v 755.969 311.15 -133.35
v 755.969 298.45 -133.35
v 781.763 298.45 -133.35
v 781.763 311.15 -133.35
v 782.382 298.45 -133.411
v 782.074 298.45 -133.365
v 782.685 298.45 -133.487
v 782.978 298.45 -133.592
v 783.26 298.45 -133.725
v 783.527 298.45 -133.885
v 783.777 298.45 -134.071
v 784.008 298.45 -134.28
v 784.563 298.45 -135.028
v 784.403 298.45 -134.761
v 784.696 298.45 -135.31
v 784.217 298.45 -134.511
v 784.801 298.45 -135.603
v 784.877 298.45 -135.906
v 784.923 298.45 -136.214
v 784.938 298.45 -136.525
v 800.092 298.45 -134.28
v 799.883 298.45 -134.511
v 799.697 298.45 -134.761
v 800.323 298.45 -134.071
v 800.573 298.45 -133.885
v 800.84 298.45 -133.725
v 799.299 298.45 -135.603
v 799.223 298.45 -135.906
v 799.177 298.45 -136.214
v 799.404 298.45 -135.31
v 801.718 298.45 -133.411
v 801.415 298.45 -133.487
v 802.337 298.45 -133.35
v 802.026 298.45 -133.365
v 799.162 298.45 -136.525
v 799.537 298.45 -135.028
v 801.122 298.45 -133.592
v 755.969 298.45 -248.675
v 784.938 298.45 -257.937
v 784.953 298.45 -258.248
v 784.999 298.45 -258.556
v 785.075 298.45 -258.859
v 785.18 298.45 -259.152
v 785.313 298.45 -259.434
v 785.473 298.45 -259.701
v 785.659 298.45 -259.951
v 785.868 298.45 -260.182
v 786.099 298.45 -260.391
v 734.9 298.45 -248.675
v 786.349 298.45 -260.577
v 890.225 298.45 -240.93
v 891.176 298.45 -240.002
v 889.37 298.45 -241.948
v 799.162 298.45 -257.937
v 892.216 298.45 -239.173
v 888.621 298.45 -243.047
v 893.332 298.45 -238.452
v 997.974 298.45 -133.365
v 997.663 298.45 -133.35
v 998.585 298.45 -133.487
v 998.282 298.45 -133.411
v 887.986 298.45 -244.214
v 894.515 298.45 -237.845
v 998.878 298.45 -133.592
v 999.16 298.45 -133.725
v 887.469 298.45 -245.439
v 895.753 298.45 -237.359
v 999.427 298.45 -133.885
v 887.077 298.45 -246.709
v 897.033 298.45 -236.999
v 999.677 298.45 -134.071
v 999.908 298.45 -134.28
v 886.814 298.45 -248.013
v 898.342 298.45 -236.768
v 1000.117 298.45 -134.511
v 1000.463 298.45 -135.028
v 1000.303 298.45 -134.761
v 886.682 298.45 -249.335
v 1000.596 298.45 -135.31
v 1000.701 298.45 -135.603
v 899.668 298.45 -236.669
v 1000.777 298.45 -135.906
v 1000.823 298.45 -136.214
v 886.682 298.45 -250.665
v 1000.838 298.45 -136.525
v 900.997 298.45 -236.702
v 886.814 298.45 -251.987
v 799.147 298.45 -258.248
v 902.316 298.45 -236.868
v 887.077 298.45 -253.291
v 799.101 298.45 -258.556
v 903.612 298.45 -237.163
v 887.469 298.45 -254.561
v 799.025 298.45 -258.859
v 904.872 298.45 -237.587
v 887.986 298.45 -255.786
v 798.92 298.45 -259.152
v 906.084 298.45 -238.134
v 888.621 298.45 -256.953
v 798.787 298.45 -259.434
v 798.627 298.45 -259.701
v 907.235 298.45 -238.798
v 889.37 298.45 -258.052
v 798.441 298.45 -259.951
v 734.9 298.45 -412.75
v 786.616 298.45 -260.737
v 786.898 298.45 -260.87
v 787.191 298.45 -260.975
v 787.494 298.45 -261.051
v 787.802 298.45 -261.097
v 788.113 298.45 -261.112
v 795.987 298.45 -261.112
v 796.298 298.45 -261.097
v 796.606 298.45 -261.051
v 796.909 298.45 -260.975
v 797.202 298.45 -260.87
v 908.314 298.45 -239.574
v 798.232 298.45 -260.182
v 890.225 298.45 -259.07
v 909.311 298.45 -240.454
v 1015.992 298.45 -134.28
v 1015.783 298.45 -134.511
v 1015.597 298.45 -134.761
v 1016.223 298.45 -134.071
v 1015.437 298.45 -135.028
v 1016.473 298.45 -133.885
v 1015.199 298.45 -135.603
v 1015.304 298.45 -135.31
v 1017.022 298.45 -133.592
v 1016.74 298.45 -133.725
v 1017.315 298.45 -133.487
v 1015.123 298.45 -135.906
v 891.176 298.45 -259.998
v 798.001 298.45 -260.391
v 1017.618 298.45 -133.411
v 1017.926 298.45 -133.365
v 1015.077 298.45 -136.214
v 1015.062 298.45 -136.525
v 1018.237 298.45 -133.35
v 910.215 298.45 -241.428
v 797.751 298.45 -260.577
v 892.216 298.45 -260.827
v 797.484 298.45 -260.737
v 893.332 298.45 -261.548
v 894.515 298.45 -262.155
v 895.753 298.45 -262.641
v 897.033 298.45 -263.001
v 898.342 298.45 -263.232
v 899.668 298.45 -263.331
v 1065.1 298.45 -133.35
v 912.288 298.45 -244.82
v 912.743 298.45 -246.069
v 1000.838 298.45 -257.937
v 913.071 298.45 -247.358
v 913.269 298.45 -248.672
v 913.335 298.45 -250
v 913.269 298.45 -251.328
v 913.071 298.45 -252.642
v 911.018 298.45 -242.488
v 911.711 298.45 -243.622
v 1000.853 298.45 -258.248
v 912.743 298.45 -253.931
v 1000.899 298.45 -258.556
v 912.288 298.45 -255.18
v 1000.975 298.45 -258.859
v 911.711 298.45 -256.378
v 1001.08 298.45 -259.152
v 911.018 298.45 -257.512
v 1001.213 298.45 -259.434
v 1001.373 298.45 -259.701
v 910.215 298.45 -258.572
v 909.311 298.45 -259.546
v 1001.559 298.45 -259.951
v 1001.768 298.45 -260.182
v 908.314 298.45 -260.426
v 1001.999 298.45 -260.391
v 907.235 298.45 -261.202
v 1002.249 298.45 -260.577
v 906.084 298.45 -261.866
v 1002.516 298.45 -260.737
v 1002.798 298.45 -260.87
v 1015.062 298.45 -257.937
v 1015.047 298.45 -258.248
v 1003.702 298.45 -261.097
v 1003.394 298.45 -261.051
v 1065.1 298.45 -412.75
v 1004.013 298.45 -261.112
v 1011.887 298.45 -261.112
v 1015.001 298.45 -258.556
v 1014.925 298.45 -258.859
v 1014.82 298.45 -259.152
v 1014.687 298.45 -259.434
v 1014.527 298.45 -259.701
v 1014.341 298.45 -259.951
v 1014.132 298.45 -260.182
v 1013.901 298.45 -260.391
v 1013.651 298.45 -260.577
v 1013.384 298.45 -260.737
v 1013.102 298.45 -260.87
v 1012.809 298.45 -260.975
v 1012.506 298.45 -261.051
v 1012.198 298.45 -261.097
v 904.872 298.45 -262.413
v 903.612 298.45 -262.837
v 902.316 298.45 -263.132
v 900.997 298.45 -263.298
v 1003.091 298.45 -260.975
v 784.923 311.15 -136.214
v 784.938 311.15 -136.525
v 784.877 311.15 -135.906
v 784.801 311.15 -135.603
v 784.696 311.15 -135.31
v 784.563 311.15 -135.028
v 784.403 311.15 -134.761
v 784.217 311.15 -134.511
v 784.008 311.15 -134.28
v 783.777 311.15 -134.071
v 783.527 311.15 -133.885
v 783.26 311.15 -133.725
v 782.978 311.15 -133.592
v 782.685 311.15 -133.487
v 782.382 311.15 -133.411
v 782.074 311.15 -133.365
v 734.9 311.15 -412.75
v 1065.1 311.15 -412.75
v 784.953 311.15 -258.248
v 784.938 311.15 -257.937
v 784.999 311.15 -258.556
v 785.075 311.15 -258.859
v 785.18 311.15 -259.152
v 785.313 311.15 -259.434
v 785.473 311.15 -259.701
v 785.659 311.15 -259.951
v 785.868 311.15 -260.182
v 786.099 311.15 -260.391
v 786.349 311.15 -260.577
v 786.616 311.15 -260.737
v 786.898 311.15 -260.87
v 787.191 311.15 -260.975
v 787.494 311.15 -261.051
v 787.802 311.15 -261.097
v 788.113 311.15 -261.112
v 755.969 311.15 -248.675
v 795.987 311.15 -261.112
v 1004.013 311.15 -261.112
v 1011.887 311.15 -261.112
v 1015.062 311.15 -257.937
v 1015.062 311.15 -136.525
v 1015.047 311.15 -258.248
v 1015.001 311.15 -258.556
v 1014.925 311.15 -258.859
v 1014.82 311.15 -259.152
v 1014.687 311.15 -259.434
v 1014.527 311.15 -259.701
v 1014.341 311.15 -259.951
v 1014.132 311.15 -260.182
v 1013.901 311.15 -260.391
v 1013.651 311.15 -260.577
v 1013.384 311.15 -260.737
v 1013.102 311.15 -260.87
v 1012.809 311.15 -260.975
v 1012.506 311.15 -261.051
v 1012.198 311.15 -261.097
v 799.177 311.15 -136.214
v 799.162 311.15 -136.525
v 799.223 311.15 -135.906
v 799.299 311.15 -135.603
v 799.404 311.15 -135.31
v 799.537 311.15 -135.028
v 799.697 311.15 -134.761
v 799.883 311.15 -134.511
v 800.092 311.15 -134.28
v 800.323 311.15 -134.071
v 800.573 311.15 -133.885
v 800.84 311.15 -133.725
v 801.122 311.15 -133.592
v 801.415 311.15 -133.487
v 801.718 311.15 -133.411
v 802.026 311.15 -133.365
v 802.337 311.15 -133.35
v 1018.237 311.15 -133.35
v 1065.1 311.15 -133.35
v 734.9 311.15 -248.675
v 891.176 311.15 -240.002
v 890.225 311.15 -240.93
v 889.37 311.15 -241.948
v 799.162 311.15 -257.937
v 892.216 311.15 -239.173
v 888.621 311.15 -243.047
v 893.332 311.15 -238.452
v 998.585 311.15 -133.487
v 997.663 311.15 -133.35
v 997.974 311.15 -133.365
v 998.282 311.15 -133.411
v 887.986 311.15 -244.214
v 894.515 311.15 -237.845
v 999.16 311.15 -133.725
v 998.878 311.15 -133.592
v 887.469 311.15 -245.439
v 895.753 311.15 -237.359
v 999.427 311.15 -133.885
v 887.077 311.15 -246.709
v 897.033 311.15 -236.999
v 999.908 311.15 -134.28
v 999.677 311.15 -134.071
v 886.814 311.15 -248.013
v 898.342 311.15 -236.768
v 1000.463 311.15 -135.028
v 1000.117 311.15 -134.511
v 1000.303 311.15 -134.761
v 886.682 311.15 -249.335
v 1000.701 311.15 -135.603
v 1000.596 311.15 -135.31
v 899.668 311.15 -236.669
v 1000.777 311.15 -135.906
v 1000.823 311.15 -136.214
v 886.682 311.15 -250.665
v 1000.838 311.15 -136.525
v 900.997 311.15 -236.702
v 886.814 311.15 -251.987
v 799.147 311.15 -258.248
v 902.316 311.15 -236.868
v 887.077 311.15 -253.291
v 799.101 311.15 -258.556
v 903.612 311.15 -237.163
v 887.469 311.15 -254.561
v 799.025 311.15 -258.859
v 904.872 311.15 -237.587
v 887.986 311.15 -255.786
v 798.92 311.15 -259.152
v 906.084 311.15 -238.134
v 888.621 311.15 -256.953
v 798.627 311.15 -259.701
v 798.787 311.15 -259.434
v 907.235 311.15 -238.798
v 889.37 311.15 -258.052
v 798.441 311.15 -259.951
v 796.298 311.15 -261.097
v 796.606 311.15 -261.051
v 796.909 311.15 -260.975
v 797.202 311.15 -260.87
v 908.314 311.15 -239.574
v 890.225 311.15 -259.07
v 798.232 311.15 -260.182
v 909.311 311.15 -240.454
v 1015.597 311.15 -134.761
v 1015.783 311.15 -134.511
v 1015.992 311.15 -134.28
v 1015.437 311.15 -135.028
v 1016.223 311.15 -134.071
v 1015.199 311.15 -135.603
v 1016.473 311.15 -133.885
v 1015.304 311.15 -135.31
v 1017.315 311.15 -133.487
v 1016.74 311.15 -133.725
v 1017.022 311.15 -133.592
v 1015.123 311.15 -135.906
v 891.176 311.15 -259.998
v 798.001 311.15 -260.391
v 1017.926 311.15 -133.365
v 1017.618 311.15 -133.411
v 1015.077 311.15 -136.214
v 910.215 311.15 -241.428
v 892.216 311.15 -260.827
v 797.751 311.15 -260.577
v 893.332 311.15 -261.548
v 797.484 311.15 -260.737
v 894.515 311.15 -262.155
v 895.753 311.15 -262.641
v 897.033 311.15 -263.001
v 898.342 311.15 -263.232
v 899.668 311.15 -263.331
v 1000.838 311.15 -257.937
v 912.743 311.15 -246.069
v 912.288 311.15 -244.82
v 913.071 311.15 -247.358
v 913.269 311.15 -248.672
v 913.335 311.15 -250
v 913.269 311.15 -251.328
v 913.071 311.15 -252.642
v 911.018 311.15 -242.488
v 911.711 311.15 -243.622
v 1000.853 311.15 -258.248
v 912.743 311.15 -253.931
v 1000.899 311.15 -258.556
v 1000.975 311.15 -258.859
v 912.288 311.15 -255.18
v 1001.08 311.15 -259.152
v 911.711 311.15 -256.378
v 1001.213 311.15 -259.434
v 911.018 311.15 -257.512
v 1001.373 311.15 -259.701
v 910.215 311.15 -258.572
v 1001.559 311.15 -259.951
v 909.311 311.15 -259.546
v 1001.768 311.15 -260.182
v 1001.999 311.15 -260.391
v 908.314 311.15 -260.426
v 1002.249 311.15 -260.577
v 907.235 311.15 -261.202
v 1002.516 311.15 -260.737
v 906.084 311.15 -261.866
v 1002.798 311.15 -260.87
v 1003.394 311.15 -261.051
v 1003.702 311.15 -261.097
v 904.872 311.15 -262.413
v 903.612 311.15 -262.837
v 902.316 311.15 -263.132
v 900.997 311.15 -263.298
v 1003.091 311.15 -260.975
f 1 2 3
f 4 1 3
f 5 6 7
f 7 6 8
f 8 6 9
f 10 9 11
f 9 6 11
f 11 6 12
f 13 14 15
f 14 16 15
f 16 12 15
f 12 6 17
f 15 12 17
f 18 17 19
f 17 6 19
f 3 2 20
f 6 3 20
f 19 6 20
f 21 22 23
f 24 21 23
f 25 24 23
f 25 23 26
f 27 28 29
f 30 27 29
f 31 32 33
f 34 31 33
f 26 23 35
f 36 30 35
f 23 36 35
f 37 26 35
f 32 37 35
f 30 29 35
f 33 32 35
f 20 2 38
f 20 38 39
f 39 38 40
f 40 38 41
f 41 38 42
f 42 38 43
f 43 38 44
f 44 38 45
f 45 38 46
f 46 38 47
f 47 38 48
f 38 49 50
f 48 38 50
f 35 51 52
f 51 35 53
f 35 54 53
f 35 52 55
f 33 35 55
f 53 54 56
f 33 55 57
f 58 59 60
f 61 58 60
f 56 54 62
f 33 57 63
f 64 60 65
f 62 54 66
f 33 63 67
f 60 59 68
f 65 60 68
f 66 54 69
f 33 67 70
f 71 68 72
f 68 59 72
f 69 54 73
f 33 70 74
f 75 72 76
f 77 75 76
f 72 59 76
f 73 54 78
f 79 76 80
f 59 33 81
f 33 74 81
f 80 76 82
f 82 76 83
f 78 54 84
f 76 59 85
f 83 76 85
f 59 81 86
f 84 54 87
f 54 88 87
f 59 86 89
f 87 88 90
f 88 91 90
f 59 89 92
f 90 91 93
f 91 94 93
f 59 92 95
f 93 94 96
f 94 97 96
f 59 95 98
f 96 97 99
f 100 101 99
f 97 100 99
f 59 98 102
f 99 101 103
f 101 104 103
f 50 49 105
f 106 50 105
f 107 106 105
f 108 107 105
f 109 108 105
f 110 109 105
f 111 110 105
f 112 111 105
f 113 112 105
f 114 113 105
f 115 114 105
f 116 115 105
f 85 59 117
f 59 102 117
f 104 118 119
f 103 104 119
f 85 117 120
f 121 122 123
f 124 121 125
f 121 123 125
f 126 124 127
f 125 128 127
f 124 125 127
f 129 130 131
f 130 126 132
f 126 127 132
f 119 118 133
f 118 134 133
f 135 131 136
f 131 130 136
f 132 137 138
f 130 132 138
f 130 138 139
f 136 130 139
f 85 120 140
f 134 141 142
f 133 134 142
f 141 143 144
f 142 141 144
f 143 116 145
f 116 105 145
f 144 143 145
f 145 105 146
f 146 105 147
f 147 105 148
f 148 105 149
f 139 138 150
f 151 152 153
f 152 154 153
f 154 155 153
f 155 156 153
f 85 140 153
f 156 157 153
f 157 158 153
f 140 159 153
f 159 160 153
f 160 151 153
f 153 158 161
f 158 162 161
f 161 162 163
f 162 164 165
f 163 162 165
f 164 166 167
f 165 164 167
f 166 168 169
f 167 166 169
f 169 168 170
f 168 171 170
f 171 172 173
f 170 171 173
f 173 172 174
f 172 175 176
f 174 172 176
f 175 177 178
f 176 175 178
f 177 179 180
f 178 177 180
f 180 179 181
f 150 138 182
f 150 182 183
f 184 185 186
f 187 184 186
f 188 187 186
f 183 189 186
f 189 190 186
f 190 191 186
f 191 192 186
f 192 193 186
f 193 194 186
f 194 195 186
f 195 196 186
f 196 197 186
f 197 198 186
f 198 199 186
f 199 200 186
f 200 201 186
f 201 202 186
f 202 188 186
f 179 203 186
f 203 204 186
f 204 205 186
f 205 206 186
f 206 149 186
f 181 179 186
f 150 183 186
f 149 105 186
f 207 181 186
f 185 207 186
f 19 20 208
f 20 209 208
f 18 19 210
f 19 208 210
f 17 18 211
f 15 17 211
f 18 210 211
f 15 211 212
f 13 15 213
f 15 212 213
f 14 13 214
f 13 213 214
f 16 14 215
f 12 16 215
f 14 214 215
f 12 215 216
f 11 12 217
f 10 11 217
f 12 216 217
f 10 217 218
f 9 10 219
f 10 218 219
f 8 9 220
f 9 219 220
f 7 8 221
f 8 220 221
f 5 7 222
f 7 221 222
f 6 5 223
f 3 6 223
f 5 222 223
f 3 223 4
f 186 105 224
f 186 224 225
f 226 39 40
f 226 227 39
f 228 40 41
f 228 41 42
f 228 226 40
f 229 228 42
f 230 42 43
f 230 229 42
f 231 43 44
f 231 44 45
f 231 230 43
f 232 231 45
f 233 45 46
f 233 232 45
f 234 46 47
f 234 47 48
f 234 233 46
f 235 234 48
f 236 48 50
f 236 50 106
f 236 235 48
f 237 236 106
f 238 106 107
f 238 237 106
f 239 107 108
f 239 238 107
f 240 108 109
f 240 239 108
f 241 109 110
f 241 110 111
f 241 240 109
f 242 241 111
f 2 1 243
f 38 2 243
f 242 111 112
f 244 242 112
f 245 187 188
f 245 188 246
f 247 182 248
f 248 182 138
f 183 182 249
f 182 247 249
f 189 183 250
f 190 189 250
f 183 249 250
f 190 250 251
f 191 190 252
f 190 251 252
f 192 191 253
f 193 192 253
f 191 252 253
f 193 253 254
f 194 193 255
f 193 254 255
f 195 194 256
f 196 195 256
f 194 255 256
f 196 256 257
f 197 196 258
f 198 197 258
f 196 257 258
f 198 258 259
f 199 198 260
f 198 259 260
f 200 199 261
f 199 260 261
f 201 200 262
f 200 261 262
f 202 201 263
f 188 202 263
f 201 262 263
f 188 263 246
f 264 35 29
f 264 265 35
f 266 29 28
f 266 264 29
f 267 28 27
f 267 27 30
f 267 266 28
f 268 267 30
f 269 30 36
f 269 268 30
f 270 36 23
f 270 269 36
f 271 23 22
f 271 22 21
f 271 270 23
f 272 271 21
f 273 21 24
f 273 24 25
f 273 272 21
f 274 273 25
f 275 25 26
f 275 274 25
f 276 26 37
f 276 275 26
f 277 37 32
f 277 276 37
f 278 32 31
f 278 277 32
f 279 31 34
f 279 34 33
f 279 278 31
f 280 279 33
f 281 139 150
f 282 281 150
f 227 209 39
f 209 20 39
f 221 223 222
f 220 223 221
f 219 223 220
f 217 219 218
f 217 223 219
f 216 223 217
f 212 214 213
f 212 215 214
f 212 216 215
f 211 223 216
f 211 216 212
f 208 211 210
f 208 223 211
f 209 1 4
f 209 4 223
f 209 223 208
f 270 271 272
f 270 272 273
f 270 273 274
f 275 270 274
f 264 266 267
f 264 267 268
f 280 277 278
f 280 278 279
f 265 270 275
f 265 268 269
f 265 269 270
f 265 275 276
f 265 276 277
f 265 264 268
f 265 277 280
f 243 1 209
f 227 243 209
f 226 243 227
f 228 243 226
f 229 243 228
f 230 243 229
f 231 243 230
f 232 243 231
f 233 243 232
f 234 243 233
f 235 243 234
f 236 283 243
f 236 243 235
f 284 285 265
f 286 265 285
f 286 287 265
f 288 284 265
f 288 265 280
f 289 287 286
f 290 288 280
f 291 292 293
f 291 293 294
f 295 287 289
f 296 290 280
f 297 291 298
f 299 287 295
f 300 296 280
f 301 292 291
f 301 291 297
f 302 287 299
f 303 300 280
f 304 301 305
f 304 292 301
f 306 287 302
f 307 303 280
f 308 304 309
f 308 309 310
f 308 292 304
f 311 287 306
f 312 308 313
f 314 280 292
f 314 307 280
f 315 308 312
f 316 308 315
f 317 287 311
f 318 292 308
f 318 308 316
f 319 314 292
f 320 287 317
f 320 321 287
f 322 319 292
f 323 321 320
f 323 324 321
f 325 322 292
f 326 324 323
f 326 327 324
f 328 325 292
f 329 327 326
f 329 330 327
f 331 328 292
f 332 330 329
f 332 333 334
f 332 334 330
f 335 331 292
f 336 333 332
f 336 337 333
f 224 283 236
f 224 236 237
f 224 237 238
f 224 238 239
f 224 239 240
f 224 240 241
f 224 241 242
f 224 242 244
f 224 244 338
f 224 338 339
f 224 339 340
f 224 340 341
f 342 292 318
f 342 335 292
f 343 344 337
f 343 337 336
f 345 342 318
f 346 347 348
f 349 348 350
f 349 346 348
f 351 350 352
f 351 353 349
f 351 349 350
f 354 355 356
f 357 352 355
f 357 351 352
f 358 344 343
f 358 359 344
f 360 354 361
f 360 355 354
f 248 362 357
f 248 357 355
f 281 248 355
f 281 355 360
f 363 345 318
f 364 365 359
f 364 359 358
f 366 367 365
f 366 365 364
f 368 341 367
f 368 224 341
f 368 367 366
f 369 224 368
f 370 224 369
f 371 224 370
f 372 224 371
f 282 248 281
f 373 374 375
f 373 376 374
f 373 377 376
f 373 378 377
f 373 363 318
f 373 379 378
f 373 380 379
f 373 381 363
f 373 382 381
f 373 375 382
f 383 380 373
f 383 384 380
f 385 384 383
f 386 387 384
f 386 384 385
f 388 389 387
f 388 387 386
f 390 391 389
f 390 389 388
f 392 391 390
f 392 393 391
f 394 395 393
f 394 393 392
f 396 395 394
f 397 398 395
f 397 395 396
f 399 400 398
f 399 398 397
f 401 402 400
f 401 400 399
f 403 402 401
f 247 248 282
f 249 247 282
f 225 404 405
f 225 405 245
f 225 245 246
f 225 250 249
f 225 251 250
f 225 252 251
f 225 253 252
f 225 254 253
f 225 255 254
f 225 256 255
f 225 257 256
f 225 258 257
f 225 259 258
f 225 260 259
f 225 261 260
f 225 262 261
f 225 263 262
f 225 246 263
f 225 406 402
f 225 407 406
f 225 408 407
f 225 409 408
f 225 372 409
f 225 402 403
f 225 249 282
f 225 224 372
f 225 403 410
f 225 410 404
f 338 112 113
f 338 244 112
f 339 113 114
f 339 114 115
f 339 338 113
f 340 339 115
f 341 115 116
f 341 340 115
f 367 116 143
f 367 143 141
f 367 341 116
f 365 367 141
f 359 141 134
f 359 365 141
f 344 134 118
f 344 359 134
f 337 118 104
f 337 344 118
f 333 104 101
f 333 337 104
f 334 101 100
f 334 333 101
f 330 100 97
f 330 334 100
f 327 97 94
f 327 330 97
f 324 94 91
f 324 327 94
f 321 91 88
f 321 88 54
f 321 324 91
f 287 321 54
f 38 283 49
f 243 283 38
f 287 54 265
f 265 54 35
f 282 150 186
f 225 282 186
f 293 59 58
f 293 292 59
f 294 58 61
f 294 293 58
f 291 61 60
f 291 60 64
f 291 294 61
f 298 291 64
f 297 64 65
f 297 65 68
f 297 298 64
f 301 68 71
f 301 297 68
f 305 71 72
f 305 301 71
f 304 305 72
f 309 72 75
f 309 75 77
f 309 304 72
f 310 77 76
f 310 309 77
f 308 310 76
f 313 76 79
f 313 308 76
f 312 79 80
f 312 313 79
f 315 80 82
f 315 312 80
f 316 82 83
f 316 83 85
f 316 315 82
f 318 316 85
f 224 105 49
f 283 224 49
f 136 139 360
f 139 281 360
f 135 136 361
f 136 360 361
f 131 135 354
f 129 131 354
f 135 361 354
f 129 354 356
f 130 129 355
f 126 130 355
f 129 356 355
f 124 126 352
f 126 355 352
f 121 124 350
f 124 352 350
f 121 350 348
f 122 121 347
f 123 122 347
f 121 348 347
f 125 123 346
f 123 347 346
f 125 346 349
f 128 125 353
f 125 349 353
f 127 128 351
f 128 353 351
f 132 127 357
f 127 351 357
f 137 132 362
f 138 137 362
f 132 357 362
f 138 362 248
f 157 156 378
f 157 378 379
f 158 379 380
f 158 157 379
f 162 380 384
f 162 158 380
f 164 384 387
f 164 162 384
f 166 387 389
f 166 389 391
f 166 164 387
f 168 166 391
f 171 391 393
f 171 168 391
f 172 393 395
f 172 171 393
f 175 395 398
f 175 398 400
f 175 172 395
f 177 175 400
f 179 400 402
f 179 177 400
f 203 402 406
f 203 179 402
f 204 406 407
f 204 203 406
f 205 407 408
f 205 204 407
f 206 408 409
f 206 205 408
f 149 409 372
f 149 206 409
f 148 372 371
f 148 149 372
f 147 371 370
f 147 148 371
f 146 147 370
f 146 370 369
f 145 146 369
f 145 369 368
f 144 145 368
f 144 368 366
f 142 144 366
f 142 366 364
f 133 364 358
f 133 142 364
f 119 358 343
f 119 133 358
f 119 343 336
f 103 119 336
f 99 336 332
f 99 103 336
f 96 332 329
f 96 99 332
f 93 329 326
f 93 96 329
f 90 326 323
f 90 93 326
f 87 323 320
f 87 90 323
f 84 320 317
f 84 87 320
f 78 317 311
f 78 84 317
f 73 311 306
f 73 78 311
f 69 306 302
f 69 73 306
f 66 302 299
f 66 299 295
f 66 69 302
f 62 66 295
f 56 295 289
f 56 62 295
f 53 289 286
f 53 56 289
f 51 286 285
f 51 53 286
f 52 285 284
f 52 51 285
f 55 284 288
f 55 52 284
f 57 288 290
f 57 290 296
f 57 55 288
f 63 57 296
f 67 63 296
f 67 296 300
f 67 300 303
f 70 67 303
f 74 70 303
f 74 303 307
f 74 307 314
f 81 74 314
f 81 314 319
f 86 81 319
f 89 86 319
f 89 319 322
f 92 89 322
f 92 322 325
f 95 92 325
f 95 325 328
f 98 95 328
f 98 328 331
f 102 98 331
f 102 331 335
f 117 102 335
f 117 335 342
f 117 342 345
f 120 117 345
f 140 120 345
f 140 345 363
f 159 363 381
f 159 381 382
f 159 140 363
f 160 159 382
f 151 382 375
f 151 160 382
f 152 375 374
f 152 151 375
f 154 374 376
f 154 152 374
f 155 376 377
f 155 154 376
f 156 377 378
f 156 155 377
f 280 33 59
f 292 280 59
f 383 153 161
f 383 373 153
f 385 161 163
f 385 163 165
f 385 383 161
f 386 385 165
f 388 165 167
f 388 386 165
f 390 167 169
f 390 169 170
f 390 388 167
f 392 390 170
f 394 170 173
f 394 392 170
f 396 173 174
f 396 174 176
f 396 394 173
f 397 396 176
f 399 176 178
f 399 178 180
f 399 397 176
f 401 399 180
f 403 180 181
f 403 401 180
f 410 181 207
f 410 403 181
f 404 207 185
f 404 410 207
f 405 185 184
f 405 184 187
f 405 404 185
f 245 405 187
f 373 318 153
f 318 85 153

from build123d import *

# Parameters (mm, degrees)
BOSS_EXTRUDE1_DEPTH  = 12.7
CAVITY1_START        = 298.45
CAVITY1_OUTLINE_R    = 12.7
CAVITY1_DEPTH        = 12.7
CAVITY1_START_2      = 720.91620239
CAVITY1_2_DEPTH      = 22.43918751
SKETCH2_W            = 21.068746236
SKETCH2_H            = 115.32536453
CUT_EXTRUDE1_DEPTH   = 1143.349273427
MOVE_FACE_SLOTS_BY   = 0.762
MOVE_FACE_SLOTS_2_BY = 0.762
MOVE_FACE_SLOTS_3_BY = 0.762
MOVE_FACE_SLOTS_4_BY = 0.762
MOVE_FACE_SLOTS_5_BY = 0.762
MOVE_FACE_SLOTS_6_BY = 0.762
MOVE_FACE_HOLES_BY   = 0.635
SLOT_FILLETS_R       = 3.175


# Read off the part's stored shape, not the designer's step: Cavity1
with BuildPart() as part:
    # Sketch1 → Boss-Extrude1 (new body)
    with BuildSketch(Plane(origin=(0, 298.45, 0), x_dir=(-1, 0, 0), z_dir=(0, -1, 0))):
        Polygon((-798.4, 260.35), (-798.4, 133.35), (-1001.6, 133.35), (-1001.6, 260.35), (-1014.3, 260.35), (-1014.3, 133.35), (-1065.1, 133.35), (-1065.1, 412.75), (-1014.3, 412.75), (-1001.6, 412.75), (-798.4, 412.75), (-785.7, 412.75), (-734.9, 412.75), (-734.9, 133.35), (-785.7, 133.35), (-785.7, 260.35), align=None)
    extrude(amount=-BOSS_EXTRUDE1_DEPTH)

    # Cavity1 outline → Cavity1 (cut)
    with BuildSketch(Plane(origin=(0, 0, 0), x_dir=(1, 0, 0), z_dir=(0, 1, 0)).offset(CAVITY1_START)):
        with Locations((900, 250)):
            Circle(CAVITY1_OUTLINE_R)
    extrude(amount=CAVITY1_DEPTH, mode=Mode.SUBTRACT)

    # Cavity1 2 outline → Cavity1 2 (cut)
    with BuildSketch(Plane(origin=(0, 0, 0), x_dir=(0.7149295353100682, -0.6987525164445135, -0.024913456279483565), z_dir=(0.6991965099607762, 0.7144755512387232, 0.02547404837855681)).offset(CAVITY1_START_2)):
        with BuildLine():
            ThreePointArc((313.444242413, 230.081087528), (327.146171675, 242.424687318), (314.076314529, 255.435688643))
            Line((314.076314529, 255.435688643), (312, 255.374549574))
            Line((312, 255.374549574), (312, 230.195835843))
            Line((312, 230.195835843), (313.444242413, 230.081087528))
        make_face()
    extrude(amount=CAVITY1_2_DEPTH, mode=Mode.SUBTRACT)

    # Sketch2 → Cut-Extrude1 (cut, through all)
    with BuildSketch(Plane(origin=(0, 311.15, 0), x_dir=(1, 0, 0), z_dir=(0, 1, 0))):
        with Locations((745.434373118, 191.012682265)):
            Rectangle(SKETCH2_W, SKETCH2_H)
    extrude(amount=-CUT_EXTRUDE1_DEPTH, mode=Mode.SUBTRACT)

    # Move Face Slots: a face moved inward by 0.762
    extrude(part.faces().sort_by_distance((1001.6, 304.8, -196.85))[0], amount=MOVE_FACE_SLOTS_BY, dir=(-1, 0, 0), mode=Mode.SUBTRACT)

    # Move Face Slots 2: a face moved inward by 0.762
    extrude(part.faces().sort_by_distance((785.7, 304.8, -196.85))[0], amount=MOVE_FACE_SLOTS_2_BY, dir=(-1, 0, 0), mode=Mode.SUBTRACT)

    # Move Face Slots 3: a face moved inward by 0.762
    extrude(part.faces().sort_by_distance((1014.3, 304.8, -196.85))[0], amount=MOVE_FACE_SLOTS_3_BY, dir=(1, 0, 0), mode=Mode.SUBTRACT)

    # Move Face Slots 4: a face moved inward by 0.762
    extrude(part.faces().sort_by_distance((1007.95, 304.8, -260.35))[0], amount=MOVE_FACE_SLOTS_4_BY, dir=(0, 0, -1), mode=Mode.SUBTRACT)

    # Move Face Slots 5: a face moved inward by 0.762
    extrude(part.faces().sort_by_distance((798.4, 304.8, -196.85))[0], amount=MOVE_FACE_SLOTS_5_BY, dir=(1, 0, 0), mode=Mode.SUBTRACT)

    # Move Face Slots 6: a face moved inward by 0.762
    extrude(part.faces().sort_by_distance((792.05, 304.8, -260.35))[0], amount=MOVE_FACE_SLOTS_6_BY, dir=(0, 0, -1), mode=Mode.SUBTRACT)

    # Move Face Holes: a curved face moved inward by 0.635
    add(Solid.thicken(part.faces().sort_by_distance((887.3, 304.8, -250))[0], -MOVE_FACE_HOLES_BY), mode=Mode.SUBTRACT)

    # Slot Fillets
    slot_fillets_edges = [part.edges().sort_by_distance(p)[0] for p in [
        (799.162, 304.8, -261.112),
        (799.162, 304.8, -133.35),
        (1000.838, 304.8, -133.35),
        (1000.838, 304.8, -261.112),
        (1015.062, 304.8, -261.112),
        (1015.062, 304.8, -133.35),
        (784.938, 304.8, -133.35),
        (784.938, 304.8, -261.112),
    ]]
    fillet(slot_fillets_edges, radius=SLOT_FILLETS_R)


solid = part.part
